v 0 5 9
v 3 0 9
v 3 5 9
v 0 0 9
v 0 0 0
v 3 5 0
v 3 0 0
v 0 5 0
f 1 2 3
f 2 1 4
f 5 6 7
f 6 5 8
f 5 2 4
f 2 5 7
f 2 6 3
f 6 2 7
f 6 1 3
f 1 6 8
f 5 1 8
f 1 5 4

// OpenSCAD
// Generated by SolidPython 1.0.1 on 2020-07-29 00:39:26


cube(size = [3, 5, 9]);
/***********************************************
*********      SolidPython code:      **********
************************************************
 
# import packages: SolidPython
from solid import *
from solid.utils import *
from itertools import chain, combinations


class Resize:

    def __init__(self, scad_file):
        self.scad_file = scad_file
        #self.scad_file = import_scad(scad_file)
        # cone/cylinder param:
        self.r1 = 0
        self.r2 = 0
        self.h = 0
        # rectangular prism param:
        self.w = 0
        self.l = 0
        # ellipse param:
        self.r = 0

    # import OpenScad code (file name corresponds to shape)


    # classify shape + parameters
    def assign(self, param1, param2, param3):
        if self.scad_file == 'cone.scad':
            self.r1 = param1
            self.r2 = param2
            self.h = param3
        elif self.scad_file == 'cylinder.scad':
            self.r1 = param1
            self.r2 = param2
            self.h = param3
        elif self.scad_file == 'rectangularPrism.scad':
            self.h = param1
            self.l = param2
            self.w = param3
        else:
            self.r = param1
            self.h = param2

    # resize parameters
    def iterate(self):
        x = range(3, 20, 2)
        i = 1
        if self.scad_file == 'cone.scad':
            tempList = list(combinations(x, 2))
            for temp in tempList:
                param1 = temp[0]
                param2 = temp[1]
                filepath = 'produced_scad_files/' + 'cone' + str(param1) + '_' + str(param2) + '_' + '.scad'
                scad_render_to_file(cylinder(h=param1, r1=param2, r2=0), filepath)

        elif self.scad_file == 'cylinder.scad':
            tempList = list(combinations(x, 3))
            for temp in tempList:
                param1 = temp[0]
                param2 = temp[1]
                filepath = 'produced_scad_files/' + 'cylinder' + str(param1) + '_' + str(param2) + '_' + '.scad'
                scad_render_to_file(cylinder(h=param1, r1=param2, r2=param2), filepath)

        elif self.scad_file == 'rectangularPrism.scad':
            tempList = list(combinations(x, 3))
            for temp in tempList:
                param1 = temp[0]
                param2 = temp[1]
                param3 = temp[2]
                filepath = 'produced_scad_files/' + 'rectangularPrism' + str(param1) + '_' + str(param2) + '_' + str(
                    param3) + '.scad'
                scad_render_to_file(cube(size=(param1, param2, param3)), filepath)

        elif self.scad_file == 'ellipse.scad':
            tempList = list(combinations(x, 4))
            for temp in tempList:
                param1 = temp[0]
                param2 = temp[1]
                param3 = temp[2]
                param4 = temp[3]
                filepath = 'produced_scad_files/' + 'ellipse' + str(param1) + '_' + str(param2) + '_' + str(param3) + '_' + str(param4) + '.scad'
                scad_render_to_file(scale([param1, param2, param3])(sphere(r=param4)), filepath)

    def render_to_scadfile(self):
        scad_render_to_file(scad, 'example.scad') 
 
************************************************/
